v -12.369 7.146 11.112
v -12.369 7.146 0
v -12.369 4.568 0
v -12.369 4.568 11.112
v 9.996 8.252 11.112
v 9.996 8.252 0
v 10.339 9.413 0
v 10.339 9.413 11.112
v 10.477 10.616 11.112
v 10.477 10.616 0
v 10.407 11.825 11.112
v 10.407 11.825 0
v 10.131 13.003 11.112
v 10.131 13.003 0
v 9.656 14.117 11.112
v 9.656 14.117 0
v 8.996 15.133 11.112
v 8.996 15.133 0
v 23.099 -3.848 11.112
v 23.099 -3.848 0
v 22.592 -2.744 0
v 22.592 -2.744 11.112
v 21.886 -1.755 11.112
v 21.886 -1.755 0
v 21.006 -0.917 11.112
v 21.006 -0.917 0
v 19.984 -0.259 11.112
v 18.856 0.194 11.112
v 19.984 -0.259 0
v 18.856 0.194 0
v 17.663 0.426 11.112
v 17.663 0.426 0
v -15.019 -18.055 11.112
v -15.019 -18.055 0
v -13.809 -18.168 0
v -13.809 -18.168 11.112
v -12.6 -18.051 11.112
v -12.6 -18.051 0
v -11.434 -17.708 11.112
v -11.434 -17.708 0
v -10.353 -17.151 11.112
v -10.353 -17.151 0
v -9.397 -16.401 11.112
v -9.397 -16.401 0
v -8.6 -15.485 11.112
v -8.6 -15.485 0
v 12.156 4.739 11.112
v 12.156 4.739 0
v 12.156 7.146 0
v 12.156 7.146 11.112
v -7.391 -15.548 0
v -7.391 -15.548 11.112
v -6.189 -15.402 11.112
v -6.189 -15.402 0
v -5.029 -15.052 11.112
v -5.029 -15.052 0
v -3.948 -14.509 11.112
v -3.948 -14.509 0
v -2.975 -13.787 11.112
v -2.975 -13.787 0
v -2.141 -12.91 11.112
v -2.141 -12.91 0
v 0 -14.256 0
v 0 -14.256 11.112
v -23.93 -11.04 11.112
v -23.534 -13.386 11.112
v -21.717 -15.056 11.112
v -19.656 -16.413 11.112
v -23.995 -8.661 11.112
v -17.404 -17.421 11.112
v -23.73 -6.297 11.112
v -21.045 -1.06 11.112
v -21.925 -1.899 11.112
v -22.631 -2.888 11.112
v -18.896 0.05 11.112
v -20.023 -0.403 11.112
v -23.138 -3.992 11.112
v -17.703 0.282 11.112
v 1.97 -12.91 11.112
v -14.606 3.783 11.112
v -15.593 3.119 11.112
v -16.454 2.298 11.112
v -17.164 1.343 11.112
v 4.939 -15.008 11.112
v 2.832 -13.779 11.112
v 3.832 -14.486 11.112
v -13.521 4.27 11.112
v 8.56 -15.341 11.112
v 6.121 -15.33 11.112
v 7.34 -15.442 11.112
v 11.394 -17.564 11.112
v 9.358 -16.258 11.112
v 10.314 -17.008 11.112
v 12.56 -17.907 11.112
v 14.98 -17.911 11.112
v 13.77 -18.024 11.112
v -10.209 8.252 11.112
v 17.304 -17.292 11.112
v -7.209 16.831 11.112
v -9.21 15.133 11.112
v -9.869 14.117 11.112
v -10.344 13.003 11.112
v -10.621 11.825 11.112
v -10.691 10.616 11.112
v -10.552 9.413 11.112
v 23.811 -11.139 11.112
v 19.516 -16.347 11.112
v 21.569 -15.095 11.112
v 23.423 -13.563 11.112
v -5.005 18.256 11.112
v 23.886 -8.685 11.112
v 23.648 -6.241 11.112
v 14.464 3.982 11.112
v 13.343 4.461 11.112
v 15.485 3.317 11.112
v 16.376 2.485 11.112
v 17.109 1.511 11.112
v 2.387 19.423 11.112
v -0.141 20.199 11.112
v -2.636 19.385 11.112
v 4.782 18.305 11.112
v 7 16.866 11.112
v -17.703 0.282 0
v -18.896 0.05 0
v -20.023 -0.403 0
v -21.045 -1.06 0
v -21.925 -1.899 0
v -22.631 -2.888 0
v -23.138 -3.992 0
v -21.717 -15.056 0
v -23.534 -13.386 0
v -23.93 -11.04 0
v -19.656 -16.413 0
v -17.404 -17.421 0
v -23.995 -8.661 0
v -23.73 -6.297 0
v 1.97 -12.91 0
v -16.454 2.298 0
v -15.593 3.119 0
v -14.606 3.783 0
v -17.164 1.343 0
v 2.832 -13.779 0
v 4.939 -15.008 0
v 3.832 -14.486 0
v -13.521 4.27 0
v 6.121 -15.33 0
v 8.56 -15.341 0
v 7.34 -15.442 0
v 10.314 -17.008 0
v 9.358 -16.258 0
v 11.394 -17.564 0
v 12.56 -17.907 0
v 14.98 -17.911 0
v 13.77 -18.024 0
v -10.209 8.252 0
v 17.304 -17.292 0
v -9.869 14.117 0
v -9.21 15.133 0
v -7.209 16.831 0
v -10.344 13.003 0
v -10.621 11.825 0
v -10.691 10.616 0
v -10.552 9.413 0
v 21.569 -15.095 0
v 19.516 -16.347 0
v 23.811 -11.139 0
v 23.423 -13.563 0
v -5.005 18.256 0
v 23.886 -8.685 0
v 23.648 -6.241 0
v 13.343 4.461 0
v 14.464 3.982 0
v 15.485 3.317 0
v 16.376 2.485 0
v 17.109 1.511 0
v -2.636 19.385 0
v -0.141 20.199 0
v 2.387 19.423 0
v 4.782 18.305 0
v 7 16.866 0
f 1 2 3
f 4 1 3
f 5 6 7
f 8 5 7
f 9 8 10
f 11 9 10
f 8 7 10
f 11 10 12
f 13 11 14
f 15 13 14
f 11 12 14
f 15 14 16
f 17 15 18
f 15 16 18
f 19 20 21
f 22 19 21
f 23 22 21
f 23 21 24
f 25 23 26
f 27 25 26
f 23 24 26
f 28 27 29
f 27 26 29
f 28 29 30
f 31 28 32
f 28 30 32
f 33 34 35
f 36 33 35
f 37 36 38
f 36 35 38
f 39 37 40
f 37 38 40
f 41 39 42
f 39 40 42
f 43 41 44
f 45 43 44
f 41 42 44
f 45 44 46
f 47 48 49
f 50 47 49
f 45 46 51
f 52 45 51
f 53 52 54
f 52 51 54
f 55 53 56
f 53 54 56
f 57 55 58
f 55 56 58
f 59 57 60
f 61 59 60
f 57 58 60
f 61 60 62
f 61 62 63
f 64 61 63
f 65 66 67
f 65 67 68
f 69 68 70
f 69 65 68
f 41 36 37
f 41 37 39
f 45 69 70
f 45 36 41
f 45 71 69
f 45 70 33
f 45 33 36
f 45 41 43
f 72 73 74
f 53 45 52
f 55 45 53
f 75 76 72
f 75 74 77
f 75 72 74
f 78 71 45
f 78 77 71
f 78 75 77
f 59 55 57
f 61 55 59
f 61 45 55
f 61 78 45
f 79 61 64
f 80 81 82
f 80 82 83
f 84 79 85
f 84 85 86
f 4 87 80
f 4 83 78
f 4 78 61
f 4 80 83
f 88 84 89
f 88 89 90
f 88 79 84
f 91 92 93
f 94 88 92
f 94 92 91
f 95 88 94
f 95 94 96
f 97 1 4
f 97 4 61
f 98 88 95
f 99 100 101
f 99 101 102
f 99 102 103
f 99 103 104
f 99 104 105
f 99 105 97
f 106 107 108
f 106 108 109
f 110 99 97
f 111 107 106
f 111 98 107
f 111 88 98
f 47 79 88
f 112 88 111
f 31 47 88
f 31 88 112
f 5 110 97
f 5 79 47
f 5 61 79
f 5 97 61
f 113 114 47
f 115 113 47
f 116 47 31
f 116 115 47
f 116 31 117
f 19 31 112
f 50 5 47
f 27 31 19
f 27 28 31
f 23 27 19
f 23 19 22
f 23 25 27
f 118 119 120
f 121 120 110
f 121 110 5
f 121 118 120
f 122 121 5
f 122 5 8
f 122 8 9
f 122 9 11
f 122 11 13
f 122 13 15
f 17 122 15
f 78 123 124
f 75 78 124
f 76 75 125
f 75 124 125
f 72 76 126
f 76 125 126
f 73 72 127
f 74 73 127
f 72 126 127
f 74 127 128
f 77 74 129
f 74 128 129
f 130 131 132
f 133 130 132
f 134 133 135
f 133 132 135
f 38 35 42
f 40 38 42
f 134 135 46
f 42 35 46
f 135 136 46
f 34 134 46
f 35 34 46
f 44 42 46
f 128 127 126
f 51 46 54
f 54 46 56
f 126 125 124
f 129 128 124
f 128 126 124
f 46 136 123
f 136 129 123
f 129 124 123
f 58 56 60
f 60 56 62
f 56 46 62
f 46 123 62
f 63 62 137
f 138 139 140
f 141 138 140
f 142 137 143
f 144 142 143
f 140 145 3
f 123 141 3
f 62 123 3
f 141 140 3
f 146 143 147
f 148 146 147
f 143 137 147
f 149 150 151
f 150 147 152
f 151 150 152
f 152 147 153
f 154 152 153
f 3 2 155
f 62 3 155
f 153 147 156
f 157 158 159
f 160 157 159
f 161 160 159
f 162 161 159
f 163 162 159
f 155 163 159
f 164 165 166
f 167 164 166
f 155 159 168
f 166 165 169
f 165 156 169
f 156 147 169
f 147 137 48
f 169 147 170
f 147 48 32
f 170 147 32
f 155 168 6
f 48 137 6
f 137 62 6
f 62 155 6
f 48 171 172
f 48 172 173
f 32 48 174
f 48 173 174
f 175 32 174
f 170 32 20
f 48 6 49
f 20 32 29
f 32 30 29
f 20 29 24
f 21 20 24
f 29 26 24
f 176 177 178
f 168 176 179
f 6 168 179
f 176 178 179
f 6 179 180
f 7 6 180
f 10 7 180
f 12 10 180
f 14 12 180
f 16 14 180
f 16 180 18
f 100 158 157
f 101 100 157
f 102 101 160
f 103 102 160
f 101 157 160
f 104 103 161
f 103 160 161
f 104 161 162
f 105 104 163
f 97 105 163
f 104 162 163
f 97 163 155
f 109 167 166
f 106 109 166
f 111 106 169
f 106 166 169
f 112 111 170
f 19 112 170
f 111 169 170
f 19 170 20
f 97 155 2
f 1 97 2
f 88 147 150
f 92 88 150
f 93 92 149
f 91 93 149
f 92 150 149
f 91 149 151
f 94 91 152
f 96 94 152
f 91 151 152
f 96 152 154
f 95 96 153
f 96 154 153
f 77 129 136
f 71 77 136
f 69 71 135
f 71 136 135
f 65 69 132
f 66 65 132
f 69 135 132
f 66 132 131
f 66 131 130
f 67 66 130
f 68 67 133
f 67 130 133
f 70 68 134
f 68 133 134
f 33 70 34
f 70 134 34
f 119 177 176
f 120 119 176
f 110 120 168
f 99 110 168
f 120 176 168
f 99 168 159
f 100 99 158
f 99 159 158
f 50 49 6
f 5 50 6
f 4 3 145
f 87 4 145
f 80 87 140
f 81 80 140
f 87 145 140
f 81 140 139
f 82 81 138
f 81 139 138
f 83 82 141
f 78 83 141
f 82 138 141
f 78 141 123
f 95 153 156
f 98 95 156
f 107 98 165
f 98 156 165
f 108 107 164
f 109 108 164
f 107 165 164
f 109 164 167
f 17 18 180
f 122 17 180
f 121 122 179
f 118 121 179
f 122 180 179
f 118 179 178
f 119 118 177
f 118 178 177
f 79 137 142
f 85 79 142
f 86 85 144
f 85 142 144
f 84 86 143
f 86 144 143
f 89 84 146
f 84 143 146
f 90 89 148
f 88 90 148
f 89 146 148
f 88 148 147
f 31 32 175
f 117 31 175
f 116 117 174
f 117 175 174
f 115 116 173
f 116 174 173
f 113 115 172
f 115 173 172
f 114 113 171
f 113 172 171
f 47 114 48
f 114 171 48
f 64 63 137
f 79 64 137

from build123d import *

# Parameters (mm, degrees)
F1_DEPTH = 11.1125


# Not quite as in the source:
# - a length typed as a fraction of an inch, garbled in the dataset ("3 / 203.2 mm" for 3/8 in), is restored


with BuildPart() as f1:
    # F0 (on Top) → F1 (new body)
    with BuildSketch(Plane.XY):
        with BuildLine():
            ThreePointArc((-0.1411418198, 20.1985444874), (-5.0054503986, 18.2564119782), (-9.2097157612, 15.1327075437))
            ThreePointArc((-9.2097157612, 15.1327075437), (-10.6205392688, 11.8246856933), (-10.2093555033, 8.2519613206))
            Line((-10.2093555033, 8.2519613206), (-12.369341217, 7.1464567445))
            Line((-12.369341217, 7.1464567445), (-12.369341217, 4.6386048198))
            Line((-12.369341217, 4.6386048198), (-12.369341217, 4.5682978211))
            ThreePointArc((-12.369341217, 4.5682978211), (-15.5930977879, 3.1185654947), (-17.7027139134, 0.2823972963))
            ThreePointArc((-17.7027139134, 0.2823972963), (-21.0452825194, -1.0603738309), (-23.1384971151, -3.9919692741))
            ThreePointArc((-23.1384971151, -3.9919692741), (-23.9954710425, -8.6613028545), (-23.5336683691, -13.3861117065))
            ThreePointArc((-23.5336683691, -13.3861117065), (-19.6562098094, -16.4130421994), (-15.0192606046, -18.054899429))
            ThreePointArc((-15.0192606046, -18.054899429), (-11.4338171794, -17.7079201351), (-8.5996589687, -15.484556372))
            ThreePointArc((-8.5996589687, -15.484556372), (-5.0294162563, -15.0523544446), (-2.1409380715, -12.9098966718))
            Line((-2.1409380715, -12.9098966718), (0, -14.2561570176))
            Line((0, -14.2561570176), (1.9696742658, -12.9098966718))
            ThreePointArc((1.9696742658, -12.9098966718), (4.9392756736, -15.0084468105), (8.560301624, -15.3410370587))
            ThreePointArc((8.560301624, -15.3410370587), (11.3944598347, -17.5644008218), (14.9799032599, -17.9113801157))
            ThreePointArc((14.9799032599, -17.9113801157), (19.5156578324, -16.3470620723), (23.423301056, -13.563092798))
            ThreePointArc((23.423301056, -13.563092798), (23.8861103651, -8.6849198531), (23.0991397704, -3.8484499608))
            ThreePointArc((23.0991397704, -3.8484499608), (21.0059251747, -0.9168545176), (17.6633565687, 0.4259166096))
            ThreePointArc((17.6633565687, 0.4259166096), (15.4847616458, 3.3168082822), (12.1560195839, 4.739132713))
            Line((12.1560195839, 4.739132713), (12.1560195839, 7.1464567445))
            Line((12.1560195839, 7.1464567445), (9.9960338703, 8.2519613206))
            ThreePointArc((9.9960338703, 8.2519613206), (10.4072176357, 11.8246856933), (8.9963941282, 15.1327075437))
            ThreePointArc((8.9963941282, 15.1327075437), (4.7823081966, 18.3053860292), (-0.1411418198, 20.1985444874))
        make_face()
    extrude(amount=F1_DEPTH)


solid = f1.part
